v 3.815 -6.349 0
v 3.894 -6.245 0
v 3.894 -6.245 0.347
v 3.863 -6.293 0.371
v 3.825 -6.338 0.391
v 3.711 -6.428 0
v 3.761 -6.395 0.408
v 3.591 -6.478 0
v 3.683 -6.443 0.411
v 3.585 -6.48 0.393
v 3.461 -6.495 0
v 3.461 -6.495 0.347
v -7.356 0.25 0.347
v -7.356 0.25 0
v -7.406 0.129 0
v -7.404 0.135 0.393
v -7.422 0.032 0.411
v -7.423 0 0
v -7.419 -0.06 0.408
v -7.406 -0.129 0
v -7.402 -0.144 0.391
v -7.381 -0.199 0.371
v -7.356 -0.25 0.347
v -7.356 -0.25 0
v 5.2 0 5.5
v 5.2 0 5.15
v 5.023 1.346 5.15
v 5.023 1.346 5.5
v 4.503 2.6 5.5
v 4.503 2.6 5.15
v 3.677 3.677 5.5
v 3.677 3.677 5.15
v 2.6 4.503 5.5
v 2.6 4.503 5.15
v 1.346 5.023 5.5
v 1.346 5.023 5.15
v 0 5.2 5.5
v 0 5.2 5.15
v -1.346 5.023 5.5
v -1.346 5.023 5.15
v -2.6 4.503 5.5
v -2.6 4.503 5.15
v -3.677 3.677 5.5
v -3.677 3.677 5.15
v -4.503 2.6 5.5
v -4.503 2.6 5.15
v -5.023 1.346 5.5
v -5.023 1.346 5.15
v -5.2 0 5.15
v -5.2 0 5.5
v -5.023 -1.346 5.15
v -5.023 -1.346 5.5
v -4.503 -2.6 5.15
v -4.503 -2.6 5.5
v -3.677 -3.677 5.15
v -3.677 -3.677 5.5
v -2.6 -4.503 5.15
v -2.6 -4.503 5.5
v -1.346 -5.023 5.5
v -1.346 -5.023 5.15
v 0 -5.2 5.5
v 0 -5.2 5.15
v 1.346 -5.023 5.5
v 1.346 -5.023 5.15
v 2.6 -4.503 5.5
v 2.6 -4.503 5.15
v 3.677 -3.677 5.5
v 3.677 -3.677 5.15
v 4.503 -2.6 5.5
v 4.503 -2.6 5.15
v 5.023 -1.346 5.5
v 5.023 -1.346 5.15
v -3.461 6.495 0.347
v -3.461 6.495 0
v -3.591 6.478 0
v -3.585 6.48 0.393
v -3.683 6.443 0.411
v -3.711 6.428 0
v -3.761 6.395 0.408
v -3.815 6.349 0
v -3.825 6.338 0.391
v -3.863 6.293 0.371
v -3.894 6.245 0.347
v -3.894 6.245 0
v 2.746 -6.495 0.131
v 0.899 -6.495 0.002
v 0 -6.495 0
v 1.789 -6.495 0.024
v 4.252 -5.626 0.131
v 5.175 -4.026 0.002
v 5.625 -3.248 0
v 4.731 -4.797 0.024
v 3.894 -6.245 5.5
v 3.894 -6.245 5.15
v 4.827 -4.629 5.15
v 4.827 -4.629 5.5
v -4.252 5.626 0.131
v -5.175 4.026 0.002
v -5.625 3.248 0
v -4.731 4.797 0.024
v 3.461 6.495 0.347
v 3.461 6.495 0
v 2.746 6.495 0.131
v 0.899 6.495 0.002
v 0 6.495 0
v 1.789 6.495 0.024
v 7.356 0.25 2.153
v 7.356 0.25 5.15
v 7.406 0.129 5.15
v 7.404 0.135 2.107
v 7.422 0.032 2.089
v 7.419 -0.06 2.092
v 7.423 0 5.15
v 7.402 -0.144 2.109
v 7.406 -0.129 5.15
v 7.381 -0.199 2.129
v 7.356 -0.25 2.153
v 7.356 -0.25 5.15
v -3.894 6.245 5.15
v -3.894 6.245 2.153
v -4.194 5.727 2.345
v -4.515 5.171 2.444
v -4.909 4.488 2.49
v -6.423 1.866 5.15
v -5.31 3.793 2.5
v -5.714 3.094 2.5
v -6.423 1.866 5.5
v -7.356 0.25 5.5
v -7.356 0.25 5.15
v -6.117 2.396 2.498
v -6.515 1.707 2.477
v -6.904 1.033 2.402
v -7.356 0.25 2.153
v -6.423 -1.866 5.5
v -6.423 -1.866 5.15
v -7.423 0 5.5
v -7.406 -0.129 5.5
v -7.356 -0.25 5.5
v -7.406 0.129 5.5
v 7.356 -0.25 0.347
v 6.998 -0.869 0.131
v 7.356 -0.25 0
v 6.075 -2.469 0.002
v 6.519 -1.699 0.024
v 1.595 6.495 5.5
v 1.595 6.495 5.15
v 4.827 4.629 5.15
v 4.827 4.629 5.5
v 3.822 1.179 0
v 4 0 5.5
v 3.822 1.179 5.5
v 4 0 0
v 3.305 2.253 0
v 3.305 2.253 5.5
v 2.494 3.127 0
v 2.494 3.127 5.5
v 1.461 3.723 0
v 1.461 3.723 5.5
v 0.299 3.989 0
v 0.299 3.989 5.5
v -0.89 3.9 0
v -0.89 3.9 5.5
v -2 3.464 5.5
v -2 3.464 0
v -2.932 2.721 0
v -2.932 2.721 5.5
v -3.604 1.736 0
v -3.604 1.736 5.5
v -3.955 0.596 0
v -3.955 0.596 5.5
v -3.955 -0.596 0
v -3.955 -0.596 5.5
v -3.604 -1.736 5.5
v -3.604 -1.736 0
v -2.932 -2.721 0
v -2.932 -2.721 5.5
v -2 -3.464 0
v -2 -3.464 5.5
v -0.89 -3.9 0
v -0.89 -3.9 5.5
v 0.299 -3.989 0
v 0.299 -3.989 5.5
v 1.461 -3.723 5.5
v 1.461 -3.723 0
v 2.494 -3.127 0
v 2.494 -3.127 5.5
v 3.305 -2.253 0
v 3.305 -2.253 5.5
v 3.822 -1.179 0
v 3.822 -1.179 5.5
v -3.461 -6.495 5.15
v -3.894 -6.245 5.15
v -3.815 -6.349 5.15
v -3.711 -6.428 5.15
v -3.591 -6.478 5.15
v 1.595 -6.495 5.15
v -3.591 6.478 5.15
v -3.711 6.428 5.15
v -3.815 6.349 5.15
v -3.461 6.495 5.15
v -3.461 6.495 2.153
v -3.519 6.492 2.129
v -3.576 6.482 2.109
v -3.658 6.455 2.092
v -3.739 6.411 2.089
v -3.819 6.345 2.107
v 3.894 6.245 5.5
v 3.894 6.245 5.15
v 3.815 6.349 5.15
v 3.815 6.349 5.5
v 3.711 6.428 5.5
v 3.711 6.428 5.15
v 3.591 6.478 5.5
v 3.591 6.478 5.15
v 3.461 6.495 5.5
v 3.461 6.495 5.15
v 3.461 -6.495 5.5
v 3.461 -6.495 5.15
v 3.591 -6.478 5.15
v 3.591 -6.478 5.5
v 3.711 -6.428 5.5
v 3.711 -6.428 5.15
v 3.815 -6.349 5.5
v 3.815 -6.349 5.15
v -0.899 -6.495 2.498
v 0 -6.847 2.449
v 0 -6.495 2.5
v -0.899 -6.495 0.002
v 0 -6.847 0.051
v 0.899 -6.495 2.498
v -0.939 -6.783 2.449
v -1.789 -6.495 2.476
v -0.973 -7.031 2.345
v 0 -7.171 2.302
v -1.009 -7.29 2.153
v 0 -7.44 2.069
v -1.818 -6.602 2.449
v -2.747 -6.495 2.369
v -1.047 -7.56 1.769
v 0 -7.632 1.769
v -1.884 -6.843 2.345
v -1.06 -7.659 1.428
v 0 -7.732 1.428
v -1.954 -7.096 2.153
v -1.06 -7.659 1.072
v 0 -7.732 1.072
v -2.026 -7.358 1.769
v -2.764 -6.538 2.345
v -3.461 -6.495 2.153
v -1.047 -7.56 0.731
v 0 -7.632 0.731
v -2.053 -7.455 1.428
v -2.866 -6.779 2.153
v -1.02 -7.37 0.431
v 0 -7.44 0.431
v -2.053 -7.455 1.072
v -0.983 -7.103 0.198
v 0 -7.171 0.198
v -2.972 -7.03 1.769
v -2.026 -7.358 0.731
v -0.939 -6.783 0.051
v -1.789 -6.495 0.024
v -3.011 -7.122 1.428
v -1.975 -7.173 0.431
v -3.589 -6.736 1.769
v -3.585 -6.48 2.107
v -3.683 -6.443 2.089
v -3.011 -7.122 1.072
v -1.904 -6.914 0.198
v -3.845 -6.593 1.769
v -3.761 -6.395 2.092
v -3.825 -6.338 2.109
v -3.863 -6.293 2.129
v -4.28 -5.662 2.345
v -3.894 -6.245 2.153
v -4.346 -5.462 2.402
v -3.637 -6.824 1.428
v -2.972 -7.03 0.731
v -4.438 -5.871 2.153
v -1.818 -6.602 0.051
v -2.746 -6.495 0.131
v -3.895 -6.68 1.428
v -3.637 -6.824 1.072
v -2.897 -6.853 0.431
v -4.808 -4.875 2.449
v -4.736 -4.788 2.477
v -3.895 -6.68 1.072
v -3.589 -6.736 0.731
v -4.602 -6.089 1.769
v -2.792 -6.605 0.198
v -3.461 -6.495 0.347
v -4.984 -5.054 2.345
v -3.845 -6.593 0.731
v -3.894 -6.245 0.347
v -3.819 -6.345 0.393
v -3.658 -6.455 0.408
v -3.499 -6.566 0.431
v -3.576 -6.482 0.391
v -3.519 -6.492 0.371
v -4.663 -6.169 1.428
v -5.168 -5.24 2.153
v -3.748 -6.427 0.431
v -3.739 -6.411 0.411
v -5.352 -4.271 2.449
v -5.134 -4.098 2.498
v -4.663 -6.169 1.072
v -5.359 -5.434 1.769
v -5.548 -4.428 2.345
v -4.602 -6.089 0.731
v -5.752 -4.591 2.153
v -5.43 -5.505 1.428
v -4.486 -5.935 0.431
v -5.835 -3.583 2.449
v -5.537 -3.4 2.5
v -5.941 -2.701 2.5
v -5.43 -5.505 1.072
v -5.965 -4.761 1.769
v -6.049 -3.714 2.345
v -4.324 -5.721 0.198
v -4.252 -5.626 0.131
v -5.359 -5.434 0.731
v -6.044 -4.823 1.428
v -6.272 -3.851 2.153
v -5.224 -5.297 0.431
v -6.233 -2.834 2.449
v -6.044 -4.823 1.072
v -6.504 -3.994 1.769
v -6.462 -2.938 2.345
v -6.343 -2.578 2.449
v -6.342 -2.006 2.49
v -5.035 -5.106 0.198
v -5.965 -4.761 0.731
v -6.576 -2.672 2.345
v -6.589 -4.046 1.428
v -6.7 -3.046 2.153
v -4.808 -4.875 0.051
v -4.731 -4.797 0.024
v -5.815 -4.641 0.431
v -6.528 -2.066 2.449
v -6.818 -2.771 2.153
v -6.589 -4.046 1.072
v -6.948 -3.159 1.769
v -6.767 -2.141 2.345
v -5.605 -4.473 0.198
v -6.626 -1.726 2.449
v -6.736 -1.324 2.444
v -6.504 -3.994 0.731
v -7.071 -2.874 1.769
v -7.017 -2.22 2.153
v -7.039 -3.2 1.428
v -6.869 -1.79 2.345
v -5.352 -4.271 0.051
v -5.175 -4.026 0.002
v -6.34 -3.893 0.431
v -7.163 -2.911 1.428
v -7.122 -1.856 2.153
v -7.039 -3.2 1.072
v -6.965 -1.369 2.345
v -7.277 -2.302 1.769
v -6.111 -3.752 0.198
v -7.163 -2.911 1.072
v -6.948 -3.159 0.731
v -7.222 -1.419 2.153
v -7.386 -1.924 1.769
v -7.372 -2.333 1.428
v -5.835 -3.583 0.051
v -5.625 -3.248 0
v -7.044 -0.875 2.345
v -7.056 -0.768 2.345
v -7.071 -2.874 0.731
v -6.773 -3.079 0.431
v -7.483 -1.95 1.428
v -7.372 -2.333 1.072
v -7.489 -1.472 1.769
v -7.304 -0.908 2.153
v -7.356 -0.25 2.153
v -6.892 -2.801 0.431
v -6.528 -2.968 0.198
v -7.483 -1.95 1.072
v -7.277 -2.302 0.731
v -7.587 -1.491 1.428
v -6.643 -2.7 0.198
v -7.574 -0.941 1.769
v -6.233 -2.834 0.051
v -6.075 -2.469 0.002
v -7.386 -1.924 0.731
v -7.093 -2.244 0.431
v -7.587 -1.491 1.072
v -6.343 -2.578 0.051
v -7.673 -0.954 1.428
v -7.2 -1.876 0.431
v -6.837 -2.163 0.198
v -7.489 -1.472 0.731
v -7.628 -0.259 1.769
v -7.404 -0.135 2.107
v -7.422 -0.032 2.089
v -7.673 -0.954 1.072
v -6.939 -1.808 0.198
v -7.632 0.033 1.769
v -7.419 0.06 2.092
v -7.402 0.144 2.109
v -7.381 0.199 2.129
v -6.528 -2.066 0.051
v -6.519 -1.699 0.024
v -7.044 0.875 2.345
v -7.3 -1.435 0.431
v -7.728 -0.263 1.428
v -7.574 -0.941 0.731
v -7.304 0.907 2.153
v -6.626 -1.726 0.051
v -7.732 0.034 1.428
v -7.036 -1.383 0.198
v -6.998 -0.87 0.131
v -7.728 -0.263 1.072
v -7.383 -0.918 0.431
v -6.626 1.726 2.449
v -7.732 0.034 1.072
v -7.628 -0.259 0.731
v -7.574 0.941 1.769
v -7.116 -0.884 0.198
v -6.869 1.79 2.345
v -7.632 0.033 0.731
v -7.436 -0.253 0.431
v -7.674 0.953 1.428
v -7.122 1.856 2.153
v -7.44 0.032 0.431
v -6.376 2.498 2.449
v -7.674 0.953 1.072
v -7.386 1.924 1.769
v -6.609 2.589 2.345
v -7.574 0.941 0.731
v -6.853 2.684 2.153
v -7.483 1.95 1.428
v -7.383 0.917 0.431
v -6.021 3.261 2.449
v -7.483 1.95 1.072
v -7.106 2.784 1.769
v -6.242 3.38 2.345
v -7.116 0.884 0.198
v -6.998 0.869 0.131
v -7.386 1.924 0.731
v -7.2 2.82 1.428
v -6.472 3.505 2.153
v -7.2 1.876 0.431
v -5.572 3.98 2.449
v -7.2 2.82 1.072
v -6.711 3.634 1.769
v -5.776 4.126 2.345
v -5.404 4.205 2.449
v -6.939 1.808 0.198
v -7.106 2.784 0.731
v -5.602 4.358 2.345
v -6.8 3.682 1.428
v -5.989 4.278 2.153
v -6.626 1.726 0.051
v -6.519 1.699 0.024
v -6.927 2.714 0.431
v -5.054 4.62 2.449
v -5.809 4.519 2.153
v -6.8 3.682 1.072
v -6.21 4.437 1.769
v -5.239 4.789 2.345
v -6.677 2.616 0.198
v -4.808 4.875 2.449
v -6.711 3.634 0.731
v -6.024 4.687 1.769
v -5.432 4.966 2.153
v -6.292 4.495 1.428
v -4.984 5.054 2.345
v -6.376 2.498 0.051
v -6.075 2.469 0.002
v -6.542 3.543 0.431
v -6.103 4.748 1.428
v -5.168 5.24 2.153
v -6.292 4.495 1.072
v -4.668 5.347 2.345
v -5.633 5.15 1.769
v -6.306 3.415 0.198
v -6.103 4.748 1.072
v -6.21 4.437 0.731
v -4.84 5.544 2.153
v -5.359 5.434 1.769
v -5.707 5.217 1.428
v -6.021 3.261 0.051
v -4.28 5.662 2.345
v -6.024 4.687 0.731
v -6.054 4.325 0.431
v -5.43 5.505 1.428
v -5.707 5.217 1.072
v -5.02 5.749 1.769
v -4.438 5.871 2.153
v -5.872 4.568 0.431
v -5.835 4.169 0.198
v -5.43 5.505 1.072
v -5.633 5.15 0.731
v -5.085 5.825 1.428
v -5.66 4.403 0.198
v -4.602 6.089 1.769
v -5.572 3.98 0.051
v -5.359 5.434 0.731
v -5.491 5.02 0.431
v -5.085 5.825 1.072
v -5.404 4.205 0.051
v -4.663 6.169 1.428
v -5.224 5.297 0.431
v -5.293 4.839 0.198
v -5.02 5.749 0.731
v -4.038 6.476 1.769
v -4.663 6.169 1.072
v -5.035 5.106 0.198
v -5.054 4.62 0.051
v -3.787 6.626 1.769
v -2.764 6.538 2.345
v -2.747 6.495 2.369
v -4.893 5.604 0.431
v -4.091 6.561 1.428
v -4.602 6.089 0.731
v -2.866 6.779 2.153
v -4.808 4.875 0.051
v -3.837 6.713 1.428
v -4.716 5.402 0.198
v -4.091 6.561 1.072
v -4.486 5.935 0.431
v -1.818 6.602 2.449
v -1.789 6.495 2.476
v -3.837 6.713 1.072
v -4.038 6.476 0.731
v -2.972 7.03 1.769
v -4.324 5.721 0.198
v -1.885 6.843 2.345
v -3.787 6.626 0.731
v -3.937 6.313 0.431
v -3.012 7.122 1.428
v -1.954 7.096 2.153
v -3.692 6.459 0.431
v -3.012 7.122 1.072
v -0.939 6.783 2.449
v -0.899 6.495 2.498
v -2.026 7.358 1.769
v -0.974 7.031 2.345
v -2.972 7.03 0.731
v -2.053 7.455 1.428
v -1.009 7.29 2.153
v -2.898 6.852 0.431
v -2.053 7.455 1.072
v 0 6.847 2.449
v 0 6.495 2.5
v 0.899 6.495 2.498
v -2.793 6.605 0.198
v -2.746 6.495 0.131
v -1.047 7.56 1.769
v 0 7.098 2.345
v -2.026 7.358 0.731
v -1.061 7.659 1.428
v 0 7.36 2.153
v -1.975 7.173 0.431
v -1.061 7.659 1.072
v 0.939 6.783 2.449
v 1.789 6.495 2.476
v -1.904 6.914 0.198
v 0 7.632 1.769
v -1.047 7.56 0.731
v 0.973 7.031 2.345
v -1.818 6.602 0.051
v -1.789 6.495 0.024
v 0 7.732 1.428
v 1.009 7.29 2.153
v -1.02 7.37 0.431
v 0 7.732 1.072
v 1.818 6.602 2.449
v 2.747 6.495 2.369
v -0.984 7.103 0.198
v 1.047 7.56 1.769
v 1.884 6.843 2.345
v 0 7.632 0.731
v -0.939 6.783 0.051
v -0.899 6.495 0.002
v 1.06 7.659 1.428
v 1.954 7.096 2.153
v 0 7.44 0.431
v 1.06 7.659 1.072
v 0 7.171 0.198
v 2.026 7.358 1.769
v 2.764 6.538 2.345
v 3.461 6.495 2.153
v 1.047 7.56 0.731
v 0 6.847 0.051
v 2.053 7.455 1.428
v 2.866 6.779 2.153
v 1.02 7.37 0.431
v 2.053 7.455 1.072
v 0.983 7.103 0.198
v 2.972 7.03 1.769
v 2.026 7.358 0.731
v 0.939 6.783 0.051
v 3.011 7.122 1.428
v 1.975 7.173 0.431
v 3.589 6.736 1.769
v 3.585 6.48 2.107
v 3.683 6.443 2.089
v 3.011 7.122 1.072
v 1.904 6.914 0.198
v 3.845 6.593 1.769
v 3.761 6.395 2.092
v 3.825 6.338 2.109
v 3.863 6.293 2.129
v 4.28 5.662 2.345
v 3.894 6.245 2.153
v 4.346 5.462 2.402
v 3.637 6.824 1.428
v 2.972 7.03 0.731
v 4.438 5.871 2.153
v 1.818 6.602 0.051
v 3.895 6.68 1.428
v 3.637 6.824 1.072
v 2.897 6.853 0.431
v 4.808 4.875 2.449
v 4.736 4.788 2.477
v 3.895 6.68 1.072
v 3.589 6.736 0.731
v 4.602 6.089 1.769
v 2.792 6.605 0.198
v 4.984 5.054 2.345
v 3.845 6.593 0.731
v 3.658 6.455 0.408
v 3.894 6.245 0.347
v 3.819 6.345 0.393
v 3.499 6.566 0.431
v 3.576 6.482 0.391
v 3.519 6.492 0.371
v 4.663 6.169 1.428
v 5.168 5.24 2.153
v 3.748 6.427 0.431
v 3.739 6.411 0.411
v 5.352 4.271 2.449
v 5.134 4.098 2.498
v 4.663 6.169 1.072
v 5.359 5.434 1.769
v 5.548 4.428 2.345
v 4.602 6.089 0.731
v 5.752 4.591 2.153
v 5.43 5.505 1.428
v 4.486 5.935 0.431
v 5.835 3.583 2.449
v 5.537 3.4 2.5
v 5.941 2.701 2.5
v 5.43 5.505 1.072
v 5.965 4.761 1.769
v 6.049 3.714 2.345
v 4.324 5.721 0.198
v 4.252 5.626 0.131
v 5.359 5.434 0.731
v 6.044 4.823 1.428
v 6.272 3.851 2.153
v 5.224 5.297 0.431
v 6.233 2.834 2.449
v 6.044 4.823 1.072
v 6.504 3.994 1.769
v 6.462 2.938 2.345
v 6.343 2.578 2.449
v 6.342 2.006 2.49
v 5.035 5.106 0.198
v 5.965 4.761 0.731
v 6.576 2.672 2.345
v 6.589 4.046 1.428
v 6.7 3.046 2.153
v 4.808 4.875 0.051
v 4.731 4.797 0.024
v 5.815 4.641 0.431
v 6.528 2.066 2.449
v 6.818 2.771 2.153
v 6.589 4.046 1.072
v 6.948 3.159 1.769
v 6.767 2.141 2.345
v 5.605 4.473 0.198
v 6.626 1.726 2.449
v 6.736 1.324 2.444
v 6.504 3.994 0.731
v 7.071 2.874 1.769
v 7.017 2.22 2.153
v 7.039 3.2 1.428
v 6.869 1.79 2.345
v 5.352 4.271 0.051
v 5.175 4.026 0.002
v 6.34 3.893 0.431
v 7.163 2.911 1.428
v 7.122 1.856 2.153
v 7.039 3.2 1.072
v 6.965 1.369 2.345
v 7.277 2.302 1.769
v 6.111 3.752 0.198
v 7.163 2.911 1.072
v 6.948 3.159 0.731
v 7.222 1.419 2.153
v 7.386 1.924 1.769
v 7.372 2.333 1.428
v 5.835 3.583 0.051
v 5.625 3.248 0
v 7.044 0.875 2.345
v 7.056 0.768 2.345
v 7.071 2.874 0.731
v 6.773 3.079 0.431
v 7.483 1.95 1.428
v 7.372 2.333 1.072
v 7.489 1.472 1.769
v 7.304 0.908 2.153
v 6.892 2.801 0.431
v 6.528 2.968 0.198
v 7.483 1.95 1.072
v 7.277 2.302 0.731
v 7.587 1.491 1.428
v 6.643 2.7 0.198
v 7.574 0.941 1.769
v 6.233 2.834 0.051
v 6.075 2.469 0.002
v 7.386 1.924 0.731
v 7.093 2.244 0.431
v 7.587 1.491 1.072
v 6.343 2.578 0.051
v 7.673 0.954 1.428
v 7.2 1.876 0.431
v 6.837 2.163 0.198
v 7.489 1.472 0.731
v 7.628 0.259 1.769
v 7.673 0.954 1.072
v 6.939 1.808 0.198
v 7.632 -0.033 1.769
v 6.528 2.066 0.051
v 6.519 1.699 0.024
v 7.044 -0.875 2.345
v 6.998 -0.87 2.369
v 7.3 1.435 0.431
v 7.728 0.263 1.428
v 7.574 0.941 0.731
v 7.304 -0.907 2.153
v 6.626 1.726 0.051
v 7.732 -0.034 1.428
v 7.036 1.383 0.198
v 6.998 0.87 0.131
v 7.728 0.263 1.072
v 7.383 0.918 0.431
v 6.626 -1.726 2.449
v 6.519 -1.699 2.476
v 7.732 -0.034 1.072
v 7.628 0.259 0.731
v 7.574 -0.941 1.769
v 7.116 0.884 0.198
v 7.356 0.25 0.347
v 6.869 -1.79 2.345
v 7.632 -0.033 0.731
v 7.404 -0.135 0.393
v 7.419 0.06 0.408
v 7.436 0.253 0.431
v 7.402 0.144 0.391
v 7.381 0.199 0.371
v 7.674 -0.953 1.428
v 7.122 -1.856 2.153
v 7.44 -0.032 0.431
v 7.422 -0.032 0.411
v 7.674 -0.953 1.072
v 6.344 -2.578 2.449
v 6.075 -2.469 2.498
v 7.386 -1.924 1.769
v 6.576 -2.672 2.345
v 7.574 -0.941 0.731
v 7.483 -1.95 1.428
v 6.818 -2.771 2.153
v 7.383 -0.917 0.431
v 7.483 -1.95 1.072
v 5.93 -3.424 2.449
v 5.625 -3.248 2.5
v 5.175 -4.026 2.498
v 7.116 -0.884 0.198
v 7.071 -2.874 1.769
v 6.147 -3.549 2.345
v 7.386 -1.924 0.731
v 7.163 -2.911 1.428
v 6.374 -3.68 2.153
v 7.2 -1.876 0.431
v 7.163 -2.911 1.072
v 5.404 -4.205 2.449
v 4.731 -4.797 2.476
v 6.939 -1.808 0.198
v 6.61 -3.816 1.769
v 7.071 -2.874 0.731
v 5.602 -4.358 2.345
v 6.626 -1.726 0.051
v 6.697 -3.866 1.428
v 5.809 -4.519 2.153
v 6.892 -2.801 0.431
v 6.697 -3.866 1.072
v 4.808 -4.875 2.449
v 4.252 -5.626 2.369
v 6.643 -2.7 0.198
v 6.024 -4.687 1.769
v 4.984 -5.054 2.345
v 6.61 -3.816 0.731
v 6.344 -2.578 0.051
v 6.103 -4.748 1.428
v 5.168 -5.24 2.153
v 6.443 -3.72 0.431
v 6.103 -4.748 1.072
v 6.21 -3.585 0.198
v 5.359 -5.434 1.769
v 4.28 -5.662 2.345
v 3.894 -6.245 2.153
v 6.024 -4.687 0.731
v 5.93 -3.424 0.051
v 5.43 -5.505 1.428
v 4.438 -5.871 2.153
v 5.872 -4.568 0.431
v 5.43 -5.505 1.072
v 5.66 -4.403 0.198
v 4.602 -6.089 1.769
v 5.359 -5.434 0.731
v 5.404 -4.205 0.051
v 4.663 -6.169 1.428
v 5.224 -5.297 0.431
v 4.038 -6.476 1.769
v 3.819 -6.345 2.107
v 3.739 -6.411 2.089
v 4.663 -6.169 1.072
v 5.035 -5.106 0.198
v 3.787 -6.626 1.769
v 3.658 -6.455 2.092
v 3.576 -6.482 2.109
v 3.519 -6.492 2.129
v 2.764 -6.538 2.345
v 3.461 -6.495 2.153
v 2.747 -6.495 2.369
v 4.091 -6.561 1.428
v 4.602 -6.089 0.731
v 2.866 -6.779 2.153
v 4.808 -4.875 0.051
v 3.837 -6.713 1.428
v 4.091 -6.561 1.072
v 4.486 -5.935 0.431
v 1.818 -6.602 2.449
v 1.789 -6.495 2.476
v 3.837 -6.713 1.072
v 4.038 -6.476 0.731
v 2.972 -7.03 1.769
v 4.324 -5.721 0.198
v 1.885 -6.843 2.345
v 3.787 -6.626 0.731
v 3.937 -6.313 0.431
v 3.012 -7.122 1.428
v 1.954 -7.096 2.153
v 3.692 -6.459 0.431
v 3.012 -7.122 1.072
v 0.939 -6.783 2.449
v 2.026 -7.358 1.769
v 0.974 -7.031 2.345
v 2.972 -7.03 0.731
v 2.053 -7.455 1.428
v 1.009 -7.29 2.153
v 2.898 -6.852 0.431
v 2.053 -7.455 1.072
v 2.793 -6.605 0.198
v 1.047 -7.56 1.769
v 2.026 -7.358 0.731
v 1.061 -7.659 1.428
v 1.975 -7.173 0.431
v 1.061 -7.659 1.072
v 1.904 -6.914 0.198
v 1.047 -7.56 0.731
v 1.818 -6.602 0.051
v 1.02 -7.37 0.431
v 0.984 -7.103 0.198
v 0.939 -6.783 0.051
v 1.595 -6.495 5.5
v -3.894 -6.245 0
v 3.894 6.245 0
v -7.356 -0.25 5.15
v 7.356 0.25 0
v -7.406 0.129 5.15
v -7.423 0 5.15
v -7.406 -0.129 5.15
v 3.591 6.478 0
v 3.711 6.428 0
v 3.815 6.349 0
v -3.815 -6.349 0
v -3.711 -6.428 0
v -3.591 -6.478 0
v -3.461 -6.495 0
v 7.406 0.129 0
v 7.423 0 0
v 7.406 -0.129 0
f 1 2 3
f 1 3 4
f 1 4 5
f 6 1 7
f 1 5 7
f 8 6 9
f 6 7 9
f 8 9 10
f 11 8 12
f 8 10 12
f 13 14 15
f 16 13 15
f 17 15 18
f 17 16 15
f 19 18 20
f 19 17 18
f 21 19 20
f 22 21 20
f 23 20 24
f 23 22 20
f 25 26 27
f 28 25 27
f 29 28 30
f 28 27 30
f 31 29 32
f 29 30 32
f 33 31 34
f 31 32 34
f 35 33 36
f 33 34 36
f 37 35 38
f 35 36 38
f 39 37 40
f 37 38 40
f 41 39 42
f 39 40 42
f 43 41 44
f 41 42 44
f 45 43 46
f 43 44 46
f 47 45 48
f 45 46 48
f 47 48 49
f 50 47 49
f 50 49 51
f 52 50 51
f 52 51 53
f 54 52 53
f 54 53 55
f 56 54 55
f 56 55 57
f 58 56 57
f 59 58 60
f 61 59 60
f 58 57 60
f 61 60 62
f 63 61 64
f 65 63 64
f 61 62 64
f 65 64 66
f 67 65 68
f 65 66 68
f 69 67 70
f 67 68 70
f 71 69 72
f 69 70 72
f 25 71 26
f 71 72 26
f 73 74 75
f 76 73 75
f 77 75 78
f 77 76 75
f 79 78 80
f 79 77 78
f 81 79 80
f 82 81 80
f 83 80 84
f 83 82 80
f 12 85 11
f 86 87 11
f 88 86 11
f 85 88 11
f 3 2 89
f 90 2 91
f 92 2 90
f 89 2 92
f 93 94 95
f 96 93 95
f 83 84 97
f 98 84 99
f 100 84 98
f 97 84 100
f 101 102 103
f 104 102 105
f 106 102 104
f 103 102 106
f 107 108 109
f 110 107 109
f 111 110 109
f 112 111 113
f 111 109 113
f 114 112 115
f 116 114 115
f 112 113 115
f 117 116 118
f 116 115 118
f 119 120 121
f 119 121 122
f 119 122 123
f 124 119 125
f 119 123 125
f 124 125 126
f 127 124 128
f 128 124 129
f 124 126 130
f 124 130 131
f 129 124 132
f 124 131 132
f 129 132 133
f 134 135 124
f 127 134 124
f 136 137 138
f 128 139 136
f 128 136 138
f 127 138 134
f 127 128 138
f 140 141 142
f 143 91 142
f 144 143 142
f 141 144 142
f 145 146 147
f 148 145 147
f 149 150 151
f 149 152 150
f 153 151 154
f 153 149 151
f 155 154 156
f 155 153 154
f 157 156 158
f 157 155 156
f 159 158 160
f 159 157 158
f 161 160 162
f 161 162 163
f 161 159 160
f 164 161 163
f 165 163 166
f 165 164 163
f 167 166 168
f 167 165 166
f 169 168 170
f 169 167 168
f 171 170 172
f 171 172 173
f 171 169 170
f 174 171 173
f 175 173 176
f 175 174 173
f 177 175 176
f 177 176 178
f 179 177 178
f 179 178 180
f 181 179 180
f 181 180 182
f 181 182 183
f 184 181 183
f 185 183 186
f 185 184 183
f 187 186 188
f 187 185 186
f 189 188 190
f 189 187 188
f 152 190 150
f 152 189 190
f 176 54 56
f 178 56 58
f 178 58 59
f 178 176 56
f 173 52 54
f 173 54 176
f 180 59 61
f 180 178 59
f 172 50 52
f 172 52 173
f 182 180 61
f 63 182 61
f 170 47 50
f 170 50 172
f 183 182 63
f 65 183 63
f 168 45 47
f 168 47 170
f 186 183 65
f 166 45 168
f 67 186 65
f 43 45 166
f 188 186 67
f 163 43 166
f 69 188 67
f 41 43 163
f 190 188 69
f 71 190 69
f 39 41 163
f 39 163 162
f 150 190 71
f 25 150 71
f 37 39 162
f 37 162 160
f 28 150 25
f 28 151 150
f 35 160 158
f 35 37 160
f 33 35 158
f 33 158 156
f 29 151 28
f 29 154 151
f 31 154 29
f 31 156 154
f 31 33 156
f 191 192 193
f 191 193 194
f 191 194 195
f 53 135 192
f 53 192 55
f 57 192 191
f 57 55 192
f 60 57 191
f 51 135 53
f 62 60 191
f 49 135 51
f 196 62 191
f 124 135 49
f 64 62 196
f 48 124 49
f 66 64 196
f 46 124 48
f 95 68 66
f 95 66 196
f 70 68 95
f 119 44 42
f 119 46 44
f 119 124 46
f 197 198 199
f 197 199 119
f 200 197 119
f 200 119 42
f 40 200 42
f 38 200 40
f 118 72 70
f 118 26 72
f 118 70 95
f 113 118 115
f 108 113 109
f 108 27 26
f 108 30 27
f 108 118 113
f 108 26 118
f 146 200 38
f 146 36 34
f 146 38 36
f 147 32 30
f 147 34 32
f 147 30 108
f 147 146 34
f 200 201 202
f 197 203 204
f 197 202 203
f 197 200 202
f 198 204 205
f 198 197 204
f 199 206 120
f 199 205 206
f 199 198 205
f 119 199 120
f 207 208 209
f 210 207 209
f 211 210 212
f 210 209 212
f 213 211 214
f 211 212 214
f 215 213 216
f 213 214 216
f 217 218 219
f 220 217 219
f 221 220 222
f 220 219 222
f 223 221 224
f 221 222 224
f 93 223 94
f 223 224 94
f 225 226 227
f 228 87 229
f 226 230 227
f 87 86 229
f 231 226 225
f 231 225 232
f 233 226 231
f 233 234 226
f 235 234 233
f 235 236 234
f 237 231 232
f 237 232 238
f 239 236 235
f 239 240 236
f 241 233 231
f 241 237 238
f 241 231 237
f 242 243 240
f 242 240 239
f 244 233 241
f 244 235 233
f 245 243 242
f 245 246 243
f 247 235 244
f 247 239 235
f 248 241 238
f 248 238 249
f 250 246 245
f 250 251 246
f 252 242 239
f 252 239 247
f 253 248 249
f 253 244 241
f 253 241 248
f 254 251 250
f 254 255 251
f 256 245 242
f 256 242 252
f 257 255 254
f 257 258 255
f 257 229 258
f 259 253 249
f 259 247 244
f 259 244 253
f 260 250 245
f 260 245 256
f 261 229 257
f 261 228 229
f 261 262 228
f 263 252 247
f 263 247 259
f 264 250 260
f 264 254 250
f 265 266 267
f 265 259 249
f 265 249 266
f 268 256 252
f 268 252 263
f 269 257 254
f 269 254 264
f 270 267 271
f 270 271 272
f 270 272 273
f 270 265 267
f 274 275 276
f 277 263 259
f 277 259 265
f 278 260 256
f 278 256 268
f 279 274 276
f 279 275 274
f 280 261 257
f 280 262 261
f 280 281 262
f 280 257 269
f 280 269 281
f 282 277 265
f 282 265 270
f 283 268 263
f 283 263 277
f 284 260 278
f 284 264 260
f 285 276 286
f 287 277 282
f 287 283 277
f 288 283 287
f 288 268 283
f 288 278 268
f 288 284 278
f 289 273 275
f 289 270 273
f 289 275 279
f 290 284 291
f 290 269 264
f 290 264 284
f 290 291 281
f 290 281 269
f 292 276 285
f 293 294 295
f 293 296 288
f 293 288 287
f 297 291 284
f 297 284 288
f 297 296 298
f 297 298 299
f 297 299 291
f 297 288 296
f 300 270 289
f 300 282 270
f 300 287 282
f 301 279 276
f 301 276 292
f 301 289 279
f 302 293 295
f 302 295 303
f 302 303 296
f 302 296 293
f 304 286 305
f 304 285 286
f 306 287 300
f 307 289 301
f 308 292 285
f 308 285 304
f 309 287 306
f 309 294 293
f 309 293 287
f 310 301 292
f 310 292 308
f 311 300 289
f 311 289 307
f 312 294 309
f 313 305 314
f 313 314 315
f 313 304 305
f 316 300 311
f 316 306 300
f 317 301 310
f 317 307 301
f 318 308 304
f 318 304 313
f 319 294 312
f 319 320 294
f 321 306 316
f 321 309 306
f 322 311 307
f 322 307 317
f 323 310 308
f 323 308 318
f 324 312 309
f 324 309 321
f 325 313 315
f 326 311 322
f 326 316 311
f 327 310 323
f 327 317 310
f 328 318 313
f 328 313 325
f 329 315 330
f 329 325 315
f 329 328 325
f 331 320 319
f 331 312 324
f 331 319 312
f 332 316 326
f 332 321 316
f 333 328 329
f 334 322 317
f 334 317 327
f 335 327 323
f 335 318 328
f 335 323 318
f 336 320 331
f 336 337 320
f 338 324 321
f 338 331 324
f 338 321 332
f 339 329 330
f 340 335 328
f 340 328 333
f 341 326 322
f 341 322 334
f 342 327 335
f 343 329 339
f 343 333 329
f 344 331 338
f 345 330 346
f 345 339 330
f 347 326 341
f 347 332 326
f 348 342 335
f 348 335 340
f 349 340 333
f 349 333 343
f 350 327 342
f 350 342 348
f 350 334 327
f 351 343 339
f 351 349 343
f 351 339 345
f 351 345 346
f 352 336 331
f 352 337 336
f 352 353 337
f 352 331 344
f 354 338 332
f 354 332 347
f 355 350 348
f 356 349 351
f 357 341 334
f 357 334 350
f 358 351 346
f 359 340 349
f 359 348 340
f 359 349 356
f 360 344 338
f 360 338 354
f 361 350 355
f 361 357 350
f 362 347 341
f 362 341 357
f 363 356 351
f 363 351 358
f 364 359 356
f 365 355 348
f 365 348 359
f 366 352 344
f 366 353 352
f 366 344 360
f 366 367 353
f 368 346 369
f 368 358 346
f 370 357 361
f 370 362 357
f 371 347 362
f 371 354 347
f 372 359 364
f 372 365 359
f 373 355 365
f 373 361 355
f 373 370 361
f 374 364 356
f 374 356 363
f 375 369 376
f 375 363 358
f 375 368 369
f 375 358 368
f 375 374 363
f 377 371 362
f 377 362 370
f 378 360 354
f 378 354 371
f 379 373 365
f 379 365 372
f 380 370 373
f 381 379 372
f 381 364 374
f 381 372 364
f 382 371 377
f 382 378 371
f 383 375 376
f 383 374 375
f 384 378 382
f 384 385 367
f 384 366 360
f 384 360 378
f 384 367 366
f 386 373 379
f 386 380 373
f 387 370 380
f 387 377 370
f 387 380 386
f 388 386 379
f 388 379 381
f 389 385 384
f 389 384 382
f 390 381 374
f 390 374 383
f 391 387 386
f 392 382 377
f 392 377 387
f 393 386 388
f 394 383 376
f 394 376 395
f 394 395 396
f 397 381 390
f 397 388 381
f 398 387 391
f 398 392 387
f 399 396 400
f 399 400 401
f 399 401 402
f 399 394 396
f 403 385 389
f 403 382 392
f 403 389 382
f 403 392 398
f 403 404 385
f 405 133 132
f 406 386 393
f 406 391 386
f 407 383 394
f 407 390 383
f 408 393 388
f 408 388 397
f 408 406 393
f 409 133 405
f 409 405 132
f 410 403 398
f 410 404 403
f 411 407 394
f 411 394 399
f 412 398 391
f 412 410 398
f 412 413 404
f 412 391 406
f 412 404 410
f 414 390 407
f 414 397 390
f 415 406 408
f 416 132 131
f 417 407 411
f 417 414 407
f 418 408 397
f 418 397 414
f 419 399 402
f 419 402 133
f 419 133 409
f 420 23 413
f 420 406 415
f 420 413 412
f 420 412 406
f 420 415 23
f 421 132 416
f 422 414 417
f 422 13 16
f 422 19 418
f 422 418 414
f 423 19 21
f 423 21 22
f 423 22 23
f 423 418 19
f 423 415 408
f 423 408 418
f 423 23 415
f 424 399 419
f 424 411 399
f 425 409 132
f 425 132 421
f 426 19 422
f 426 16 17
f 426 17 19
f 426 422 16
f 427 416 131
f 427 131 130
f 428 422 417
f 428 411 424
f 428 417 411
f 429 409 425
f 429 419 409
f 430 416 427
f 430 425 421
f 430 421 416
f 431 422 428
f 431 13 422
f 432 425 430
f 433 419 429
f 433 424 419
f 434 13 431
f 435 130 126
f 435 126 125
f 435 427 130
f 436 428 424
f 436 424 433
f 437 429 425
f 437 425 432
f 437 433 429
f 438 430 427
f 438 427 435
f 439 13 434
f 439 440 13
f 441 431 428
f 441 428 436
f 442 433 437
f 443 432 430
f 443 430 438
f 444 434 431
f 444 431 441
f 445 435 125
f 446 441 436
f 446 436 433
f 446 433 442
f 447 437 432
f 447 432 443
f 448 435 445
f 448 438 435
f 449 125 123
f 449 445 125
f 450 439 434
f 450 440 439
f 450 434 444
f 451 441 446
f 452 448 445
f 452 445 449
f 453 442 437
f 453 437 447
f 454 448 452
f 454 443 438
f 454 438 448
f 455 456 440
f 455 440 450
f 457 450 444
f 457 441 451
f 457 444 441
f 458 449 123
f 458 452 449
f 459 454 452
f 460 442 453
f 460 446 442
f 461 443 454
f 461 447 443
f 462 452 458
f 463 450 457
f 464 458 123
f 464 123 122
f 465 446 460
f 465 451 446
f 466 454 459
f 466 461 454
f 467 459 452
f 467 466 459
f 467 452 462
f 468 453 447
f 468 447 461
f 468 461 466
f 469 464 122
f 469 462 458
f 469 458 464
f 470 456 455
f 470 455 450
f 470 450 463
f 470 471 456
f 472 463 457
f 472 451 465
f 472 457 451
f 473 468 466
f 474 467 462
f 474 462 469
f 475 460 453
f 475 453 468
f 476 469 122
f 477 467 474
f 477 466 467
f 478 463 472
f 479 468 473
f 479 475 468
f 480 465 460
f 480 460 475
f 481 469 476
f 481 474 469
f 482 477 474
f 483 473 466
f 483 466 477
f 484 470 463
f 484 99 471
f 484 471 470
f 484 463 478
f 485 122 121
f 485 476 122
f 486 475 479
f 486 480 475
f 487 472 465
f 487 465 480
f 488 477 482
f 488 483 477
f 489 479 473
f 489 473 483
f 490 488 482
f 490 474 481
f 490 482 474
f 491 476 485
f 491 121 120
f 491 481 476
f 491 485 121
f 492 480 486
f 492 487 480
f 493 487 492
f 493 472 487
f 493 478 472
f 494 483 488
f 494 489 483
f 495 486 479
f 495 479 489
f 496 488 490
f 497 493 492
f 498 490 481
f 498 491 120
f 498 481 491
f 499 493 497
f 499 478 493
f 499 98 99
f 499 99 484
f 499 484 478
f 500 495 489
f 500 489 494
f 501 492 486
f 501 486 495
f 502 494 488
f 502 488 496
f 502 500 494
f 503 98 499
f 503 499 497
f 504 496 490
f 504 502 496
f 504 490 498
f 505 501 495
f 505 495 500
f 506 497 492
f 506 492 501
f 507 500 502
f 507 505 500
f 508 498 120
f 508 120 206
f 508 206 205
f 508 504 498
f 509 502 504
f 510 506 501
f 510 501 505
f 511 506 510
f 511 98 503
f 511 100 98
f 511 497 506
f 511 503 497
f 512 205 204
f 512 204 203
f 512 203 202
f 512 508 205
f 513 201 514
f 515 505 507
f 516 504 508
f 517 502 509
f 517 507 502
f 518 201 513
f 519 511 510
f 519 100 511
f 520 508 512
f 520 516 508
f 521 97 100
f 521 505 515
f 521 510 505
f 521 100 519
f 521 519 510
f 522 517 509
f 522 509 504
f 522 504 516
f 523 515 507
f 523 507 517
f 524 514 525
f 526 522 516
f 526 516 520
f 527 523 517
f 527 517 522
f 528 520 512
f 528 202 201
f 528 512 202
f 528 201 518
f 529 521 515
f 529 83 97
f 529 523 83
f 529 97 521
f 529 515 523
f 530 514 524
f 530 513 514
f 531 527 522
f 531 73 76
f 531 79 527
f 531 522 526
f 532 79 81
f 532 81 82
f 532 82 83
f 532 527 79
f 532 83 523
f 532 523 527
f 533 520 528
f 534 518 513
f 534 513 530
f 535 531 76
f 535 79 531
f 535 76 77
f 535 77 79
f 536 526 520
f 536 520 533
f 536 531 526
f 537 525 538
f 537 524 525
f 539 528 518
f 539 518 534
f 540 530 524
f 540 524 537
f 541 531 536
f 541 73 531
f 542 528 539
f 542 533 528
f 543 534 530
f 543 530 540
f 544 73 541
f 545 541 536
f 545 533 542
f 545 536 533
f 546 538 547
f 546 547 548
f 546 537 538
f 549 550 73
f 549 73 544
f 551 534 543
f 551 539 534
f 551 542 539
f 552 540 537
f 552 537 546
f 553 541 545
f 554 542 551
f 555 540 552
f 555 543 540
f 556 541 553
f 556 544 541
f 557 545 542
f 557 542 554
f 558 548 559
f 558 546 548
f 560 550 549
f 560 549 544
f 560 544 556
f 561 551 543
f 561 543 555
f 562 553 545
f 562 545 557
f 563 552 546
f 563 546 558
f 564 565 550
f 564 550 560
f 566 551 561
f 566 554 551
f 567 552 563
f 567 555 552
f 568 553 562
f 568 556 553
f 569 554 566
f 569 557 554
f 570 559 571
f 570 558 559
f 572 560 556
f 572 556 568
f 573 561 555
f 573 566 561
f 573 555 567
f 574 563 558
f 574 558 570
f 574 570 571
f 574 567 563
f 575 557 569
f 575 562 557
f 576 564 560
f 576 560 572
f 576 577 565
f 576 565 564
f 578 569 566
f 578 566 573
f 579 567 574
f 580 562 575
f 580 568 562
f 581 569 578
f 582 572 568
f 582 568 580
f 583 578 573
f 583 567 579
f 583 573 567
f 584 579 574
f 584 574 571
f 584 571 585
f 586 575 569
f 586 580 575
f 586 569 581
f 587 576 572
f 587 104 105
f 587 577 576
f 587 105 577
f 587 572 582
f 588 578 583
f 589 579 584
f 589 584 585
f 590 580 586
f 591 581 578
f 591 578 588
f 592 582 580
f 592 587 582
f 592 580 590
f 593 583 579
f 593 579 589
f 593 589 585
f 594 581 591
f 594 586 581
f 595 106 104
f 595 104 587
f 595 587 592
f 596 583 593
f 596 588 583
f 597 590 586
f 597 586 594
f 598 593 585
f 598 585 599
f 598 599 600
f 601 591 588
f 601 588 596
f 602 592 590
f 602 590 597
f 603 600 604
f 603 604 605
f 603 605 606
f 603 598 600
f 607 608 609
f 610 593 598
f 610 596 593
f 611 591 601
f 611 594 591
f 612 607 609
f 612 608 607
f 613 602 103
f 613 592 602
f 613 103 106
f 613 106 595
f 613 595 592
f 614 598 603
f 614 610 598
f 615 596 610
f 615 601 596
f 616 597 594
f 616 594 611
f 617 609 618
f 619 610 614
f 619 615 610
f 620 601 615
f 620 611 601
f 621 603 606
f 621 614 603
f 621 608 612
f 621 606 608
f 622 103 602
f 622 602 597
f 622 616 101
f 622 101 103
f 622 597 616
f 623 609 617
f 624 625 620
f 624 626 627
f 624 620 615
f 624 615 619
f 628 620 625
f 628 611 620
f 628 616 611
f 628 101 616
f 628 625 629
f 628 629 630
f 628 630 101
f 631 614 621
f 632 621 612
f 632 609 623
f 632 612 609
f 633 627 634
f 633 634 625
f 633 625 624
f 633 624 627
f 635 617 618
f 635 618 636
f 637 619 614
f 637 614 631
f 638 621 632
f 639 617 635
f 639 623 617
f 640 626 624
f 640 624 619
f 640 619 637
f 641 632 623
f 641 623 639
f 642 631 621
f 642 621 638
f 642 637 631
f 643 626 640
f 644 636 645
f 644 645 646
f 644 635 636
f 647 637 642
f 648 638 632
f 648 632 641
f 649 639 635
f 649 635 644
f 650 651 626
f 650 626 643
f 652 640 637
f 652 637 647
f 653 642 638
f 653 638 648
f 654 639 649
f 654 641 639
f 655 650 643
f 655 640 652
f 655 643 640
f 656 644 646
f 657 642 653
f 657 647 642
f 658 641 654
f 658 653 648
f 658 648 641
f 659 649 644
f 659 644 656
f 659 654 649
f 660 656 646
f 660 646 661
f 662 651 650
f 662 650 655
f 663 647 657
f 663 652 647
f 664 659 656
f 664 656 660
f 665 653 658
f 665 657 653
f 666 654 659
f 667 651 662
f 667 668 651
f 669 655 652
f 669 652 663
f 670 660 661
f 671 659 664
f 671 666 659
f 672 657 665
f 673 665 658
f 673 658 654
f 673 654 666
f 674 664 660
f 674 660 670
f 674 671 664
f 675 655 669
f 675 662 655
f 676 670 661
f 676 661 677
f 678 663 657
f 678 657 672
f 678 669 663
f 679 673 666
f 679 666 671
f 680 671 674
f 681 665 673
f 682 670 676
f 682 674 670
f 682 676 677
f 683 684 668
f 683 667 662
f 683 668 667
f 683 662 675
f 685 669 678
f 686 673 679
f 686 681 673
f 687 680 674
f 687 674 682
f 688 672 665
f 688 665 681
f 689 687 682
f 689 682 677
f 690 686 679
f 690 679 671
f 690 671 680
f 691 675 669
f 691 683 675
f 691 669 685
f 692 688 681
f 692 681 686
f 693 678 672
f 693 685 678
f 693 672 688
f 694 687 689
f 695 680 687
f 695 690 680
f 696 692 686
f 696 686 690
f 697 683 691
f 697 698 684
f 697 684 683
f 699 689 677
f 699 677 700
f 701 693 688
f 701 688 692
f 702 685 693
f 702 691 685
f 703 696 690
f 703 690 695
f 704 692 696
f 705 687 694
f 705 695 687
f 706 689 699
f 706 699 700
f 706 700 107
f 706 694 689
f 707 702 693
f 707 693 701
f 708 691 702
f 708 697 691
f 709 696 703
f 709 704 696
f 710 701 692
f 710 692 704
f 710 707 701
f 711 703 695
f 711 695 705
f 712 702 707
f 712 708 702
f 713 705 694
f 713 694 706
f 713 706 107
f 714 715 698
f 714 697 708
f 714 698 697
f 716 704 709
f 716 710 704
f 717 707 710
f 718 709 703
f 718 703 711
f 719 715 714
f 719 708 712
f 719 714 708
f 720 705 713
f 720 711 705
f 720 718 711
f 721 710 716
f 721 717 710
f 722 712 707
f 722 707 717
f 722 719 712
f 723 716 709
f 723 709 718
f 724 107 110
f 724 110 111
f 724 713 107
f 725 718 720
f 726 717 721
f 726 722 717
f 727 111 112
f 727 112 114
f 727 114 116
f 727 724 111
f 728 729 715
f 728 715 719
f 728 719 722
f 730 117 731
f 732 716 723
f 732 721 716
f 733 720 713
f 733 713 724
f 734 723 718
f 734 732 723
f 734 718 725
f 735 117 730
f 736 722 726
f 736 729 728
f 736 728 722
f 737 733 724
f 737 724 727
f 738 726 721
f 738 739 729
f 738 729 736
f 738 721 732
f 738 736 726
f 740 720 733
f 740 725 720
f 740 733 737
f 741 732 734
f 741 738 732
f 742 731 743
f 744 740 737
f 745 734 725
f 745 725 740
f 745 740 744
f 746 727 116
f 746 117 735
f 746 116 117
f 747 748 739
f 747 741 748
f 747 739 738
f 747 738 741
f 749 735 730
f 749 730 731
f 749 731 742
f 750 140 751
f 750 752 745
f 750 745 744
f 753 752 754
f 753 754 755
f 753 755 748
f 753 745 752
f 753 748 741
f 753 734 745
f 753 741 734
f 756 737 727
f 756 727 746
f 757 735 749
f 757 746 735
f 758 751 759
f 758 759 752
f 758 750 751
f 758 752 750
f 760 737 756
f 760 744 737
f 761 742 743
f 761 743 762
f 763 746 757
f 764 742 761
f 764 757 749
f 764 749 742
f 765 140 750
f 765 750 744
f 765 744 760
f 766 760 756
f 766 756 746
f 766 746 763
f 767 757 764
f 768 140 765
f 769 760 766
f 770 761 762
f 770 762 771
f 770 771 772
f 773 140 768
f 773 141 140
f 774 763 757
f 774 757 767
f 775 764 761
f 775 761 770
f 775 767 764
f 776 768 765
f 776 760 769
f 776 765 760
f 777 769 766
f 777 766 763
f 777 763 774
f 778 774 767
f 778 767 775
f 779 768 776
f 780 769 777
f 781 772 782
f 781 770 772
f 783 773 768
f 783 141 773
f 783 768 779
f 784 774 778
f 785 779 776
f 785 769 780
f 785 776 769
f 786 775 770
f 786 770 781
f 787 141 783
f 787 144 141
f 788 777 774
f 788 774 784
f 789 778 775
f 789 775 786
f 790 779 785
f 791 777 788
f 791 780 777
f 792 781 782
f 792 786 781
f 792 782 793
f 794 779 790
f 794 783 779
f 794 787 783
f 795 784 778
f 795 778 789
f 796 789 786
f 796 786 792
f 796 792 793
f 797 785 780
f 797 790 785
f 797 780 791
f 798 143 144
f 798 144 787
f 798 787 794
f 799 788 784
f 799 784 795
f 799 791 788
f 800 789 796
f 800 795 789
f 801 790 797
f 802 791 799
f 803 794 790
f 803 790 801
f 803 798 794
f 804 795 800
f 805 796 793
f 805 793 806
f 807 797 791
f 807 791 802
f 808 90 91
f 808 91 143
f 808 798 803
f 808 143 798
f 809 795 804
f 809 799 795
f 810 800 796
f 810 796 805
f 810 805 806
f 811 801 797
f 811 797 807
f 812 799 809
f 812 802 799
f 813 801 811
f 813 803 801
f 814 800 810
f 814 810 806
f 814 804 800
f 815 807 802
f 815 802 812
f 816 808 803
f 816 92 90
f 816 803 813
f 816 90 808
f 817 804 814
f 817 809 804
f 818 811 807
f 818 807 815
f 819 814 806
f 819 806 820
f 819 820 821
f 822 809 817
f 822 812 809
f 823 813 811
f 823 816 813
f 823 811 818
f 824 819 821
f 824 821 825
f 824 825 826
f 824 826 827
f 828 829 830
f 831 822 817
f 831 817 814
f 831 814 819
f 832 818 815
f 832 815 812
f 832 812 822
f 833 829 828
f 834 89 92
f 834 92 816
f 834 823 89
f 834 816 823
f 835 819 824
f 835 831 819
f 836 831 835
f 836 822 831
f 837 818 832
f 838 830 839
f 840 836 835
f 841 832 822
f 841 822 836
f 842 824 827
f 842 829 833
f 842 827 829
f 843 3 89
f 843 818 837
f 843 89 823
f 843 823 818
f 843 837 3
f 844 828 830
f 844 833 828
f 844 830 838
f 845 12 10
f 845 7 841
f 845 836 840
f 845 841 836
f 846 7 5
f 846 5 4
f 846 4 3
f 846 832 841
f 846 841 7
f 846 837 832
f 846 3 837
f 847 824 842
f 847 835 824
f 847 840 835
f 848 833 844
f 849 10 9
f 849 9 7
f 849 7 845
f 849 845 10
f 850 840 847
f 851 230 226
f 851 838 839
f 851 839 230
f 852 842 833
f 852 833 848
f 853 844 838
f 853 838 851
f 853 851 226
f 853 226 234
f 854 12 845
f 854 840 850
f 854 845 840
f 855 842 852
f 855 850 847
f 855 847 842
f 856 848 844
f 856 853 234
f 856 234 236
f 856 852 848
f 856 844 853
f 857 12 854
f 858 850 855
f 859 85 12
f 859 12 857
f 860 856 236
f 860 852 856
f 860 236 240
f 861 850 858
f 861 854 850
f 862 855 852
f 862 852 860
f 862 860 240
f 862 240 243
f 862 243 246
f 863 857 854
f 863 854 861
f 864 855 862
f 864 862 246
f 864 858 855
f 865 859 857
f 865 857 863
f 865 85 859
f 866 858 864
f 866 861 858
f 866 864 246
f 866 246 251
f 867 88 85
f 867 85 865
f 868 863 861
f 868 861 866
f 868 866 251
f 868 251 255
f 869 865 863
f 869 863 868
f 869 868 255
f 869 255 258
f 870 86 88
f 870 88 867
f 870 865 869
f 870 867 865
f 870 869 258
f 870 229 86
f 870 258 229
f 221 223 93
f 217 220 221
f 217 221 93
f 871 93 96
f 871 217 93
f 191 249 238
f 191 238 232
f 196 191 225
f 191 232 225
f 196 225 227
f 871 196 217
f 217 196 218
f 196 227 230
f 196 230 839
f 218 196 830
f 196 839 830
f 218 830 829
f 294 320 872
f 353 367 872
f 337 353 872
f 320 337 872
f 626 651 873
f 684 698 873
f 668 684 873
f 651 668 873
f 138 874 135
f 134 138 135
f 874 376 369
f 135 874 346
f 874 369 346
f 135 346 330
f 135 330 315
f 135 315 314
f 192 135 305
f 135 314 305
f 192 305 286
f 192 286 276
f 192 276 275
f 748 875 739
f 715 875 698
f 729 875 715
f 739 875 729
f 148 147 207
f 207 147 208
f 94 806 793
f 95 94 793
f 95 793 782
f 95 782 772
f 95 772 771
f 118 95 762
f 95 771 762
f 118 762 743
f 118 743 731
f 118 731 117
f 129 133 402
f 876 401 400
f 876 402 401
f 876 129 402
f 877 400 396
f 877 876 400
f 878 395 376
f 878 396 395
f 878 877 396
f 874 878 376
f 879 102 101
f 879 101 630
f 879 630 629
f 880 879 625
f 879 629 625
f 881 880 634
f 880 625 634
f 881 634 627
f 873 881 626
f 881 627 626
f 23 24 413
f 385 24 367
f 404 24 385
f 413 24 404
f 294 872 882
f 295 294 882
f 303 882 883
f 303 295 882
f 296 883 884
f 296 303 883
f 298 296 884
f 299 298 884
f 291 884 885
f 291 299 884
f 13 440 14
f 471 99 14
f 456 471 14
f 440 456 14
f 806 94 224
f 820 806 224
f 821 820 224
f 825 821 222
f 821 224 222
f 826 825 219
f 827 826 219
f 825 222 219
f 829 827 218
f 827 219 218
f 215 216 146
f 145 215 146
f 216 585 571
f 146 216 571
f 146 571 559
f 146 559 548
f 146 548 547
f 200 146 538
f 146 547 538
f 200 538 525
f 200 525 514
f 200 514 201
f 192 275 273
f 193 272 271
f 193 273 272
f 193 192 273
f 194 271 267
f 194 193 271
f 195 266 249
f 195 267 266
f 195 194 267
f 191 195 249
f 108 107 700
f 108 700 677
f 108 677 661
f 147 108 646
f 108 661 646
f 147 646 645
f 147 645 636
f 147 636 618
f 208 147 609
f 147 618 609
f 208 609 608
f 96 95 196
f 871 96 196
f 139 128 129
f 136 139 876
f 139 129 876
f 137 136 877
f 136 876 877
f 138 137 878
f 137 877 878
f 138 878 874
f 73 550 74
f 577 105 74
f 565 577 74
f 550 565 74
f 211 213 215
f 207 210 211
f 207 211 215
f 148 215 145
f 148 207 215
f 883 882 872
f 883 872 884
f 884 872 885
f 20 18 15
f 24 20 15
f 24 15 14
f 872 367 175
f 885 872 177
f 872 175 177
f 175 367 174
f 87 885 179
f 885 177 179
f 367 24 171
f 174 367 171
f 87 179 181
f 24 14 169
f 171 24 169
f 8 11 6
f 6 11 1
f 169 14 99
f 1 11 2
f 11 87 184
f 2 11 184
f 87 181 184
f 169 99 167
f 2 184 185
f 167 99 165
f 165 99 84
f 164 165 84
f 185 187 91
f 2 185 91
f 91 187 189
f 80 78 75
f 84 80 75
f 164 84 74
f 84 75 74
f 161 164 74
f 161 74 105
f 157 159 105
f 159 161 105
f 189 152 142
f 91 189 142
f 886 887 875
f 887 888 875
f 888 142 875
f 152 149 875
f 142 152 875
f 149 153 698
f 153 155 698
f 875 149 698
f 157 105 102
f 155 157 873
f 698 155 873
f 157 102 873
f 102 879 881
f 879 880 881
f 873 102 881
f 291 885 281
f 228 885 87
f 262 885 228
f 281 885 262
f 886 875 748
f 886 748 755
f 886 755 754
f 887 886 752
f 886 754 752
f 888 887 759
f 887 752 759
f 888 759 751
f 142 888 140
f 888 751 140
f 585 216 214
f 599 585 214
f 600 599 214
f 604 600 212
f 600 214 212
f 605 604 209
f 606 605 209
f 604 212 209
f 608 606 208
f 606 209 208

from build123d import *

# Parameters (mm, degrees)
F0_R            = 4
F1_DEPTH        = 5.15
F2_R            = 0.5
F4_DEPTH        = 0.35
F4_COPIES_COUNT = 3
F3_R            = 5.2
F3_R_2          = 4
F5_DEPTH        = 0.35


# Not quite as in the source:
# - a pattern or mirror of a feature is missing from the dataset's text; its kind, count and spacing are read off the source's solid


with BuildPart() as f1:
    # F0 (on Top) → F1 (new body)
    with BuildSketch(Plane.XY):
        Polygon((3.75, 6.4951905284), (-3.75, 6.4951905284), (-7.5, 0), (-3.75, -6.4951905284), (3.75, -6.4951905284), (7.5, 0), align=None)
        Circle(F0_R, mode=Mode.SUBTRACT)
    extrude(amount=F1_DEPTH)

    # F2
    f2_edges = [f1.edges().sort_by_distance(p)[0] for p in [
        (3.75, -6.495191, 2.575),
        (7.5, 0, 2.575),
        (3.75, 6.495191, 2.575),
        (-3.75, 6.495191, 2.575),
        (-7.5, 0, 2.575),
        (-3.75, -6.495191, 2.575),
    ]]
    fillet(f2_edges, radius=F2_R)

    # F3 (on face) → F4 (join)
    with BuildSketch(Plane.XY.offset(5.15)):
        with BuildLine():
            Line((-6.4226497308, 1.8660254038), (-7.3556624327, 0.25))
            ThreePointArc((-7.3556624327, 0.25), (-7.4226497308, 0), (-7.3556624327, -0.25))
            Line((-7.3556624327, -0.25), (-6.4226497308, -1.8660254038))
            Line((-6.4226497308, -1.8660254038), (-6.4226497308, 1.8660254038))
        make_face()
    f4 = extrude(amount=F4_DEPTH)

    # F4_copies: F4 ×3 about axis
    f4_copies_axis = Axis((0, 0, 0), (0, 0, 1))
    for i in range(1, F4_COPIES_COUNT):
        add(f4.rotate(f4_copies_axis, i * 360 / F4_COPIES_COUNT))

    # F3 (on face) → F5 (join, through all)
    with BuildSketch(Plane.XY.offset(5.15)):
        Circle(F3_R)
        Circle(F3_R_2, mode=Mode.SUBTRACT)
    extrude(amount=F5_DEPTH)

    # F6 (on Right) → F7 (revolve)
    with BuildSketch(Plane.YZ):
        with BuildLine():
            ThreePointArc((-6.4951905284, 2.5), (-7.7451905284, 1.25), (-6.4951905284, 0))
            Line((-6.4951905284, 0), (-6.4951905284, 2.5))
        make_face()
    revolve(axis=Axis((0, 0, -0.6419573572), (0, 0, -1)))


solid = f1.part
